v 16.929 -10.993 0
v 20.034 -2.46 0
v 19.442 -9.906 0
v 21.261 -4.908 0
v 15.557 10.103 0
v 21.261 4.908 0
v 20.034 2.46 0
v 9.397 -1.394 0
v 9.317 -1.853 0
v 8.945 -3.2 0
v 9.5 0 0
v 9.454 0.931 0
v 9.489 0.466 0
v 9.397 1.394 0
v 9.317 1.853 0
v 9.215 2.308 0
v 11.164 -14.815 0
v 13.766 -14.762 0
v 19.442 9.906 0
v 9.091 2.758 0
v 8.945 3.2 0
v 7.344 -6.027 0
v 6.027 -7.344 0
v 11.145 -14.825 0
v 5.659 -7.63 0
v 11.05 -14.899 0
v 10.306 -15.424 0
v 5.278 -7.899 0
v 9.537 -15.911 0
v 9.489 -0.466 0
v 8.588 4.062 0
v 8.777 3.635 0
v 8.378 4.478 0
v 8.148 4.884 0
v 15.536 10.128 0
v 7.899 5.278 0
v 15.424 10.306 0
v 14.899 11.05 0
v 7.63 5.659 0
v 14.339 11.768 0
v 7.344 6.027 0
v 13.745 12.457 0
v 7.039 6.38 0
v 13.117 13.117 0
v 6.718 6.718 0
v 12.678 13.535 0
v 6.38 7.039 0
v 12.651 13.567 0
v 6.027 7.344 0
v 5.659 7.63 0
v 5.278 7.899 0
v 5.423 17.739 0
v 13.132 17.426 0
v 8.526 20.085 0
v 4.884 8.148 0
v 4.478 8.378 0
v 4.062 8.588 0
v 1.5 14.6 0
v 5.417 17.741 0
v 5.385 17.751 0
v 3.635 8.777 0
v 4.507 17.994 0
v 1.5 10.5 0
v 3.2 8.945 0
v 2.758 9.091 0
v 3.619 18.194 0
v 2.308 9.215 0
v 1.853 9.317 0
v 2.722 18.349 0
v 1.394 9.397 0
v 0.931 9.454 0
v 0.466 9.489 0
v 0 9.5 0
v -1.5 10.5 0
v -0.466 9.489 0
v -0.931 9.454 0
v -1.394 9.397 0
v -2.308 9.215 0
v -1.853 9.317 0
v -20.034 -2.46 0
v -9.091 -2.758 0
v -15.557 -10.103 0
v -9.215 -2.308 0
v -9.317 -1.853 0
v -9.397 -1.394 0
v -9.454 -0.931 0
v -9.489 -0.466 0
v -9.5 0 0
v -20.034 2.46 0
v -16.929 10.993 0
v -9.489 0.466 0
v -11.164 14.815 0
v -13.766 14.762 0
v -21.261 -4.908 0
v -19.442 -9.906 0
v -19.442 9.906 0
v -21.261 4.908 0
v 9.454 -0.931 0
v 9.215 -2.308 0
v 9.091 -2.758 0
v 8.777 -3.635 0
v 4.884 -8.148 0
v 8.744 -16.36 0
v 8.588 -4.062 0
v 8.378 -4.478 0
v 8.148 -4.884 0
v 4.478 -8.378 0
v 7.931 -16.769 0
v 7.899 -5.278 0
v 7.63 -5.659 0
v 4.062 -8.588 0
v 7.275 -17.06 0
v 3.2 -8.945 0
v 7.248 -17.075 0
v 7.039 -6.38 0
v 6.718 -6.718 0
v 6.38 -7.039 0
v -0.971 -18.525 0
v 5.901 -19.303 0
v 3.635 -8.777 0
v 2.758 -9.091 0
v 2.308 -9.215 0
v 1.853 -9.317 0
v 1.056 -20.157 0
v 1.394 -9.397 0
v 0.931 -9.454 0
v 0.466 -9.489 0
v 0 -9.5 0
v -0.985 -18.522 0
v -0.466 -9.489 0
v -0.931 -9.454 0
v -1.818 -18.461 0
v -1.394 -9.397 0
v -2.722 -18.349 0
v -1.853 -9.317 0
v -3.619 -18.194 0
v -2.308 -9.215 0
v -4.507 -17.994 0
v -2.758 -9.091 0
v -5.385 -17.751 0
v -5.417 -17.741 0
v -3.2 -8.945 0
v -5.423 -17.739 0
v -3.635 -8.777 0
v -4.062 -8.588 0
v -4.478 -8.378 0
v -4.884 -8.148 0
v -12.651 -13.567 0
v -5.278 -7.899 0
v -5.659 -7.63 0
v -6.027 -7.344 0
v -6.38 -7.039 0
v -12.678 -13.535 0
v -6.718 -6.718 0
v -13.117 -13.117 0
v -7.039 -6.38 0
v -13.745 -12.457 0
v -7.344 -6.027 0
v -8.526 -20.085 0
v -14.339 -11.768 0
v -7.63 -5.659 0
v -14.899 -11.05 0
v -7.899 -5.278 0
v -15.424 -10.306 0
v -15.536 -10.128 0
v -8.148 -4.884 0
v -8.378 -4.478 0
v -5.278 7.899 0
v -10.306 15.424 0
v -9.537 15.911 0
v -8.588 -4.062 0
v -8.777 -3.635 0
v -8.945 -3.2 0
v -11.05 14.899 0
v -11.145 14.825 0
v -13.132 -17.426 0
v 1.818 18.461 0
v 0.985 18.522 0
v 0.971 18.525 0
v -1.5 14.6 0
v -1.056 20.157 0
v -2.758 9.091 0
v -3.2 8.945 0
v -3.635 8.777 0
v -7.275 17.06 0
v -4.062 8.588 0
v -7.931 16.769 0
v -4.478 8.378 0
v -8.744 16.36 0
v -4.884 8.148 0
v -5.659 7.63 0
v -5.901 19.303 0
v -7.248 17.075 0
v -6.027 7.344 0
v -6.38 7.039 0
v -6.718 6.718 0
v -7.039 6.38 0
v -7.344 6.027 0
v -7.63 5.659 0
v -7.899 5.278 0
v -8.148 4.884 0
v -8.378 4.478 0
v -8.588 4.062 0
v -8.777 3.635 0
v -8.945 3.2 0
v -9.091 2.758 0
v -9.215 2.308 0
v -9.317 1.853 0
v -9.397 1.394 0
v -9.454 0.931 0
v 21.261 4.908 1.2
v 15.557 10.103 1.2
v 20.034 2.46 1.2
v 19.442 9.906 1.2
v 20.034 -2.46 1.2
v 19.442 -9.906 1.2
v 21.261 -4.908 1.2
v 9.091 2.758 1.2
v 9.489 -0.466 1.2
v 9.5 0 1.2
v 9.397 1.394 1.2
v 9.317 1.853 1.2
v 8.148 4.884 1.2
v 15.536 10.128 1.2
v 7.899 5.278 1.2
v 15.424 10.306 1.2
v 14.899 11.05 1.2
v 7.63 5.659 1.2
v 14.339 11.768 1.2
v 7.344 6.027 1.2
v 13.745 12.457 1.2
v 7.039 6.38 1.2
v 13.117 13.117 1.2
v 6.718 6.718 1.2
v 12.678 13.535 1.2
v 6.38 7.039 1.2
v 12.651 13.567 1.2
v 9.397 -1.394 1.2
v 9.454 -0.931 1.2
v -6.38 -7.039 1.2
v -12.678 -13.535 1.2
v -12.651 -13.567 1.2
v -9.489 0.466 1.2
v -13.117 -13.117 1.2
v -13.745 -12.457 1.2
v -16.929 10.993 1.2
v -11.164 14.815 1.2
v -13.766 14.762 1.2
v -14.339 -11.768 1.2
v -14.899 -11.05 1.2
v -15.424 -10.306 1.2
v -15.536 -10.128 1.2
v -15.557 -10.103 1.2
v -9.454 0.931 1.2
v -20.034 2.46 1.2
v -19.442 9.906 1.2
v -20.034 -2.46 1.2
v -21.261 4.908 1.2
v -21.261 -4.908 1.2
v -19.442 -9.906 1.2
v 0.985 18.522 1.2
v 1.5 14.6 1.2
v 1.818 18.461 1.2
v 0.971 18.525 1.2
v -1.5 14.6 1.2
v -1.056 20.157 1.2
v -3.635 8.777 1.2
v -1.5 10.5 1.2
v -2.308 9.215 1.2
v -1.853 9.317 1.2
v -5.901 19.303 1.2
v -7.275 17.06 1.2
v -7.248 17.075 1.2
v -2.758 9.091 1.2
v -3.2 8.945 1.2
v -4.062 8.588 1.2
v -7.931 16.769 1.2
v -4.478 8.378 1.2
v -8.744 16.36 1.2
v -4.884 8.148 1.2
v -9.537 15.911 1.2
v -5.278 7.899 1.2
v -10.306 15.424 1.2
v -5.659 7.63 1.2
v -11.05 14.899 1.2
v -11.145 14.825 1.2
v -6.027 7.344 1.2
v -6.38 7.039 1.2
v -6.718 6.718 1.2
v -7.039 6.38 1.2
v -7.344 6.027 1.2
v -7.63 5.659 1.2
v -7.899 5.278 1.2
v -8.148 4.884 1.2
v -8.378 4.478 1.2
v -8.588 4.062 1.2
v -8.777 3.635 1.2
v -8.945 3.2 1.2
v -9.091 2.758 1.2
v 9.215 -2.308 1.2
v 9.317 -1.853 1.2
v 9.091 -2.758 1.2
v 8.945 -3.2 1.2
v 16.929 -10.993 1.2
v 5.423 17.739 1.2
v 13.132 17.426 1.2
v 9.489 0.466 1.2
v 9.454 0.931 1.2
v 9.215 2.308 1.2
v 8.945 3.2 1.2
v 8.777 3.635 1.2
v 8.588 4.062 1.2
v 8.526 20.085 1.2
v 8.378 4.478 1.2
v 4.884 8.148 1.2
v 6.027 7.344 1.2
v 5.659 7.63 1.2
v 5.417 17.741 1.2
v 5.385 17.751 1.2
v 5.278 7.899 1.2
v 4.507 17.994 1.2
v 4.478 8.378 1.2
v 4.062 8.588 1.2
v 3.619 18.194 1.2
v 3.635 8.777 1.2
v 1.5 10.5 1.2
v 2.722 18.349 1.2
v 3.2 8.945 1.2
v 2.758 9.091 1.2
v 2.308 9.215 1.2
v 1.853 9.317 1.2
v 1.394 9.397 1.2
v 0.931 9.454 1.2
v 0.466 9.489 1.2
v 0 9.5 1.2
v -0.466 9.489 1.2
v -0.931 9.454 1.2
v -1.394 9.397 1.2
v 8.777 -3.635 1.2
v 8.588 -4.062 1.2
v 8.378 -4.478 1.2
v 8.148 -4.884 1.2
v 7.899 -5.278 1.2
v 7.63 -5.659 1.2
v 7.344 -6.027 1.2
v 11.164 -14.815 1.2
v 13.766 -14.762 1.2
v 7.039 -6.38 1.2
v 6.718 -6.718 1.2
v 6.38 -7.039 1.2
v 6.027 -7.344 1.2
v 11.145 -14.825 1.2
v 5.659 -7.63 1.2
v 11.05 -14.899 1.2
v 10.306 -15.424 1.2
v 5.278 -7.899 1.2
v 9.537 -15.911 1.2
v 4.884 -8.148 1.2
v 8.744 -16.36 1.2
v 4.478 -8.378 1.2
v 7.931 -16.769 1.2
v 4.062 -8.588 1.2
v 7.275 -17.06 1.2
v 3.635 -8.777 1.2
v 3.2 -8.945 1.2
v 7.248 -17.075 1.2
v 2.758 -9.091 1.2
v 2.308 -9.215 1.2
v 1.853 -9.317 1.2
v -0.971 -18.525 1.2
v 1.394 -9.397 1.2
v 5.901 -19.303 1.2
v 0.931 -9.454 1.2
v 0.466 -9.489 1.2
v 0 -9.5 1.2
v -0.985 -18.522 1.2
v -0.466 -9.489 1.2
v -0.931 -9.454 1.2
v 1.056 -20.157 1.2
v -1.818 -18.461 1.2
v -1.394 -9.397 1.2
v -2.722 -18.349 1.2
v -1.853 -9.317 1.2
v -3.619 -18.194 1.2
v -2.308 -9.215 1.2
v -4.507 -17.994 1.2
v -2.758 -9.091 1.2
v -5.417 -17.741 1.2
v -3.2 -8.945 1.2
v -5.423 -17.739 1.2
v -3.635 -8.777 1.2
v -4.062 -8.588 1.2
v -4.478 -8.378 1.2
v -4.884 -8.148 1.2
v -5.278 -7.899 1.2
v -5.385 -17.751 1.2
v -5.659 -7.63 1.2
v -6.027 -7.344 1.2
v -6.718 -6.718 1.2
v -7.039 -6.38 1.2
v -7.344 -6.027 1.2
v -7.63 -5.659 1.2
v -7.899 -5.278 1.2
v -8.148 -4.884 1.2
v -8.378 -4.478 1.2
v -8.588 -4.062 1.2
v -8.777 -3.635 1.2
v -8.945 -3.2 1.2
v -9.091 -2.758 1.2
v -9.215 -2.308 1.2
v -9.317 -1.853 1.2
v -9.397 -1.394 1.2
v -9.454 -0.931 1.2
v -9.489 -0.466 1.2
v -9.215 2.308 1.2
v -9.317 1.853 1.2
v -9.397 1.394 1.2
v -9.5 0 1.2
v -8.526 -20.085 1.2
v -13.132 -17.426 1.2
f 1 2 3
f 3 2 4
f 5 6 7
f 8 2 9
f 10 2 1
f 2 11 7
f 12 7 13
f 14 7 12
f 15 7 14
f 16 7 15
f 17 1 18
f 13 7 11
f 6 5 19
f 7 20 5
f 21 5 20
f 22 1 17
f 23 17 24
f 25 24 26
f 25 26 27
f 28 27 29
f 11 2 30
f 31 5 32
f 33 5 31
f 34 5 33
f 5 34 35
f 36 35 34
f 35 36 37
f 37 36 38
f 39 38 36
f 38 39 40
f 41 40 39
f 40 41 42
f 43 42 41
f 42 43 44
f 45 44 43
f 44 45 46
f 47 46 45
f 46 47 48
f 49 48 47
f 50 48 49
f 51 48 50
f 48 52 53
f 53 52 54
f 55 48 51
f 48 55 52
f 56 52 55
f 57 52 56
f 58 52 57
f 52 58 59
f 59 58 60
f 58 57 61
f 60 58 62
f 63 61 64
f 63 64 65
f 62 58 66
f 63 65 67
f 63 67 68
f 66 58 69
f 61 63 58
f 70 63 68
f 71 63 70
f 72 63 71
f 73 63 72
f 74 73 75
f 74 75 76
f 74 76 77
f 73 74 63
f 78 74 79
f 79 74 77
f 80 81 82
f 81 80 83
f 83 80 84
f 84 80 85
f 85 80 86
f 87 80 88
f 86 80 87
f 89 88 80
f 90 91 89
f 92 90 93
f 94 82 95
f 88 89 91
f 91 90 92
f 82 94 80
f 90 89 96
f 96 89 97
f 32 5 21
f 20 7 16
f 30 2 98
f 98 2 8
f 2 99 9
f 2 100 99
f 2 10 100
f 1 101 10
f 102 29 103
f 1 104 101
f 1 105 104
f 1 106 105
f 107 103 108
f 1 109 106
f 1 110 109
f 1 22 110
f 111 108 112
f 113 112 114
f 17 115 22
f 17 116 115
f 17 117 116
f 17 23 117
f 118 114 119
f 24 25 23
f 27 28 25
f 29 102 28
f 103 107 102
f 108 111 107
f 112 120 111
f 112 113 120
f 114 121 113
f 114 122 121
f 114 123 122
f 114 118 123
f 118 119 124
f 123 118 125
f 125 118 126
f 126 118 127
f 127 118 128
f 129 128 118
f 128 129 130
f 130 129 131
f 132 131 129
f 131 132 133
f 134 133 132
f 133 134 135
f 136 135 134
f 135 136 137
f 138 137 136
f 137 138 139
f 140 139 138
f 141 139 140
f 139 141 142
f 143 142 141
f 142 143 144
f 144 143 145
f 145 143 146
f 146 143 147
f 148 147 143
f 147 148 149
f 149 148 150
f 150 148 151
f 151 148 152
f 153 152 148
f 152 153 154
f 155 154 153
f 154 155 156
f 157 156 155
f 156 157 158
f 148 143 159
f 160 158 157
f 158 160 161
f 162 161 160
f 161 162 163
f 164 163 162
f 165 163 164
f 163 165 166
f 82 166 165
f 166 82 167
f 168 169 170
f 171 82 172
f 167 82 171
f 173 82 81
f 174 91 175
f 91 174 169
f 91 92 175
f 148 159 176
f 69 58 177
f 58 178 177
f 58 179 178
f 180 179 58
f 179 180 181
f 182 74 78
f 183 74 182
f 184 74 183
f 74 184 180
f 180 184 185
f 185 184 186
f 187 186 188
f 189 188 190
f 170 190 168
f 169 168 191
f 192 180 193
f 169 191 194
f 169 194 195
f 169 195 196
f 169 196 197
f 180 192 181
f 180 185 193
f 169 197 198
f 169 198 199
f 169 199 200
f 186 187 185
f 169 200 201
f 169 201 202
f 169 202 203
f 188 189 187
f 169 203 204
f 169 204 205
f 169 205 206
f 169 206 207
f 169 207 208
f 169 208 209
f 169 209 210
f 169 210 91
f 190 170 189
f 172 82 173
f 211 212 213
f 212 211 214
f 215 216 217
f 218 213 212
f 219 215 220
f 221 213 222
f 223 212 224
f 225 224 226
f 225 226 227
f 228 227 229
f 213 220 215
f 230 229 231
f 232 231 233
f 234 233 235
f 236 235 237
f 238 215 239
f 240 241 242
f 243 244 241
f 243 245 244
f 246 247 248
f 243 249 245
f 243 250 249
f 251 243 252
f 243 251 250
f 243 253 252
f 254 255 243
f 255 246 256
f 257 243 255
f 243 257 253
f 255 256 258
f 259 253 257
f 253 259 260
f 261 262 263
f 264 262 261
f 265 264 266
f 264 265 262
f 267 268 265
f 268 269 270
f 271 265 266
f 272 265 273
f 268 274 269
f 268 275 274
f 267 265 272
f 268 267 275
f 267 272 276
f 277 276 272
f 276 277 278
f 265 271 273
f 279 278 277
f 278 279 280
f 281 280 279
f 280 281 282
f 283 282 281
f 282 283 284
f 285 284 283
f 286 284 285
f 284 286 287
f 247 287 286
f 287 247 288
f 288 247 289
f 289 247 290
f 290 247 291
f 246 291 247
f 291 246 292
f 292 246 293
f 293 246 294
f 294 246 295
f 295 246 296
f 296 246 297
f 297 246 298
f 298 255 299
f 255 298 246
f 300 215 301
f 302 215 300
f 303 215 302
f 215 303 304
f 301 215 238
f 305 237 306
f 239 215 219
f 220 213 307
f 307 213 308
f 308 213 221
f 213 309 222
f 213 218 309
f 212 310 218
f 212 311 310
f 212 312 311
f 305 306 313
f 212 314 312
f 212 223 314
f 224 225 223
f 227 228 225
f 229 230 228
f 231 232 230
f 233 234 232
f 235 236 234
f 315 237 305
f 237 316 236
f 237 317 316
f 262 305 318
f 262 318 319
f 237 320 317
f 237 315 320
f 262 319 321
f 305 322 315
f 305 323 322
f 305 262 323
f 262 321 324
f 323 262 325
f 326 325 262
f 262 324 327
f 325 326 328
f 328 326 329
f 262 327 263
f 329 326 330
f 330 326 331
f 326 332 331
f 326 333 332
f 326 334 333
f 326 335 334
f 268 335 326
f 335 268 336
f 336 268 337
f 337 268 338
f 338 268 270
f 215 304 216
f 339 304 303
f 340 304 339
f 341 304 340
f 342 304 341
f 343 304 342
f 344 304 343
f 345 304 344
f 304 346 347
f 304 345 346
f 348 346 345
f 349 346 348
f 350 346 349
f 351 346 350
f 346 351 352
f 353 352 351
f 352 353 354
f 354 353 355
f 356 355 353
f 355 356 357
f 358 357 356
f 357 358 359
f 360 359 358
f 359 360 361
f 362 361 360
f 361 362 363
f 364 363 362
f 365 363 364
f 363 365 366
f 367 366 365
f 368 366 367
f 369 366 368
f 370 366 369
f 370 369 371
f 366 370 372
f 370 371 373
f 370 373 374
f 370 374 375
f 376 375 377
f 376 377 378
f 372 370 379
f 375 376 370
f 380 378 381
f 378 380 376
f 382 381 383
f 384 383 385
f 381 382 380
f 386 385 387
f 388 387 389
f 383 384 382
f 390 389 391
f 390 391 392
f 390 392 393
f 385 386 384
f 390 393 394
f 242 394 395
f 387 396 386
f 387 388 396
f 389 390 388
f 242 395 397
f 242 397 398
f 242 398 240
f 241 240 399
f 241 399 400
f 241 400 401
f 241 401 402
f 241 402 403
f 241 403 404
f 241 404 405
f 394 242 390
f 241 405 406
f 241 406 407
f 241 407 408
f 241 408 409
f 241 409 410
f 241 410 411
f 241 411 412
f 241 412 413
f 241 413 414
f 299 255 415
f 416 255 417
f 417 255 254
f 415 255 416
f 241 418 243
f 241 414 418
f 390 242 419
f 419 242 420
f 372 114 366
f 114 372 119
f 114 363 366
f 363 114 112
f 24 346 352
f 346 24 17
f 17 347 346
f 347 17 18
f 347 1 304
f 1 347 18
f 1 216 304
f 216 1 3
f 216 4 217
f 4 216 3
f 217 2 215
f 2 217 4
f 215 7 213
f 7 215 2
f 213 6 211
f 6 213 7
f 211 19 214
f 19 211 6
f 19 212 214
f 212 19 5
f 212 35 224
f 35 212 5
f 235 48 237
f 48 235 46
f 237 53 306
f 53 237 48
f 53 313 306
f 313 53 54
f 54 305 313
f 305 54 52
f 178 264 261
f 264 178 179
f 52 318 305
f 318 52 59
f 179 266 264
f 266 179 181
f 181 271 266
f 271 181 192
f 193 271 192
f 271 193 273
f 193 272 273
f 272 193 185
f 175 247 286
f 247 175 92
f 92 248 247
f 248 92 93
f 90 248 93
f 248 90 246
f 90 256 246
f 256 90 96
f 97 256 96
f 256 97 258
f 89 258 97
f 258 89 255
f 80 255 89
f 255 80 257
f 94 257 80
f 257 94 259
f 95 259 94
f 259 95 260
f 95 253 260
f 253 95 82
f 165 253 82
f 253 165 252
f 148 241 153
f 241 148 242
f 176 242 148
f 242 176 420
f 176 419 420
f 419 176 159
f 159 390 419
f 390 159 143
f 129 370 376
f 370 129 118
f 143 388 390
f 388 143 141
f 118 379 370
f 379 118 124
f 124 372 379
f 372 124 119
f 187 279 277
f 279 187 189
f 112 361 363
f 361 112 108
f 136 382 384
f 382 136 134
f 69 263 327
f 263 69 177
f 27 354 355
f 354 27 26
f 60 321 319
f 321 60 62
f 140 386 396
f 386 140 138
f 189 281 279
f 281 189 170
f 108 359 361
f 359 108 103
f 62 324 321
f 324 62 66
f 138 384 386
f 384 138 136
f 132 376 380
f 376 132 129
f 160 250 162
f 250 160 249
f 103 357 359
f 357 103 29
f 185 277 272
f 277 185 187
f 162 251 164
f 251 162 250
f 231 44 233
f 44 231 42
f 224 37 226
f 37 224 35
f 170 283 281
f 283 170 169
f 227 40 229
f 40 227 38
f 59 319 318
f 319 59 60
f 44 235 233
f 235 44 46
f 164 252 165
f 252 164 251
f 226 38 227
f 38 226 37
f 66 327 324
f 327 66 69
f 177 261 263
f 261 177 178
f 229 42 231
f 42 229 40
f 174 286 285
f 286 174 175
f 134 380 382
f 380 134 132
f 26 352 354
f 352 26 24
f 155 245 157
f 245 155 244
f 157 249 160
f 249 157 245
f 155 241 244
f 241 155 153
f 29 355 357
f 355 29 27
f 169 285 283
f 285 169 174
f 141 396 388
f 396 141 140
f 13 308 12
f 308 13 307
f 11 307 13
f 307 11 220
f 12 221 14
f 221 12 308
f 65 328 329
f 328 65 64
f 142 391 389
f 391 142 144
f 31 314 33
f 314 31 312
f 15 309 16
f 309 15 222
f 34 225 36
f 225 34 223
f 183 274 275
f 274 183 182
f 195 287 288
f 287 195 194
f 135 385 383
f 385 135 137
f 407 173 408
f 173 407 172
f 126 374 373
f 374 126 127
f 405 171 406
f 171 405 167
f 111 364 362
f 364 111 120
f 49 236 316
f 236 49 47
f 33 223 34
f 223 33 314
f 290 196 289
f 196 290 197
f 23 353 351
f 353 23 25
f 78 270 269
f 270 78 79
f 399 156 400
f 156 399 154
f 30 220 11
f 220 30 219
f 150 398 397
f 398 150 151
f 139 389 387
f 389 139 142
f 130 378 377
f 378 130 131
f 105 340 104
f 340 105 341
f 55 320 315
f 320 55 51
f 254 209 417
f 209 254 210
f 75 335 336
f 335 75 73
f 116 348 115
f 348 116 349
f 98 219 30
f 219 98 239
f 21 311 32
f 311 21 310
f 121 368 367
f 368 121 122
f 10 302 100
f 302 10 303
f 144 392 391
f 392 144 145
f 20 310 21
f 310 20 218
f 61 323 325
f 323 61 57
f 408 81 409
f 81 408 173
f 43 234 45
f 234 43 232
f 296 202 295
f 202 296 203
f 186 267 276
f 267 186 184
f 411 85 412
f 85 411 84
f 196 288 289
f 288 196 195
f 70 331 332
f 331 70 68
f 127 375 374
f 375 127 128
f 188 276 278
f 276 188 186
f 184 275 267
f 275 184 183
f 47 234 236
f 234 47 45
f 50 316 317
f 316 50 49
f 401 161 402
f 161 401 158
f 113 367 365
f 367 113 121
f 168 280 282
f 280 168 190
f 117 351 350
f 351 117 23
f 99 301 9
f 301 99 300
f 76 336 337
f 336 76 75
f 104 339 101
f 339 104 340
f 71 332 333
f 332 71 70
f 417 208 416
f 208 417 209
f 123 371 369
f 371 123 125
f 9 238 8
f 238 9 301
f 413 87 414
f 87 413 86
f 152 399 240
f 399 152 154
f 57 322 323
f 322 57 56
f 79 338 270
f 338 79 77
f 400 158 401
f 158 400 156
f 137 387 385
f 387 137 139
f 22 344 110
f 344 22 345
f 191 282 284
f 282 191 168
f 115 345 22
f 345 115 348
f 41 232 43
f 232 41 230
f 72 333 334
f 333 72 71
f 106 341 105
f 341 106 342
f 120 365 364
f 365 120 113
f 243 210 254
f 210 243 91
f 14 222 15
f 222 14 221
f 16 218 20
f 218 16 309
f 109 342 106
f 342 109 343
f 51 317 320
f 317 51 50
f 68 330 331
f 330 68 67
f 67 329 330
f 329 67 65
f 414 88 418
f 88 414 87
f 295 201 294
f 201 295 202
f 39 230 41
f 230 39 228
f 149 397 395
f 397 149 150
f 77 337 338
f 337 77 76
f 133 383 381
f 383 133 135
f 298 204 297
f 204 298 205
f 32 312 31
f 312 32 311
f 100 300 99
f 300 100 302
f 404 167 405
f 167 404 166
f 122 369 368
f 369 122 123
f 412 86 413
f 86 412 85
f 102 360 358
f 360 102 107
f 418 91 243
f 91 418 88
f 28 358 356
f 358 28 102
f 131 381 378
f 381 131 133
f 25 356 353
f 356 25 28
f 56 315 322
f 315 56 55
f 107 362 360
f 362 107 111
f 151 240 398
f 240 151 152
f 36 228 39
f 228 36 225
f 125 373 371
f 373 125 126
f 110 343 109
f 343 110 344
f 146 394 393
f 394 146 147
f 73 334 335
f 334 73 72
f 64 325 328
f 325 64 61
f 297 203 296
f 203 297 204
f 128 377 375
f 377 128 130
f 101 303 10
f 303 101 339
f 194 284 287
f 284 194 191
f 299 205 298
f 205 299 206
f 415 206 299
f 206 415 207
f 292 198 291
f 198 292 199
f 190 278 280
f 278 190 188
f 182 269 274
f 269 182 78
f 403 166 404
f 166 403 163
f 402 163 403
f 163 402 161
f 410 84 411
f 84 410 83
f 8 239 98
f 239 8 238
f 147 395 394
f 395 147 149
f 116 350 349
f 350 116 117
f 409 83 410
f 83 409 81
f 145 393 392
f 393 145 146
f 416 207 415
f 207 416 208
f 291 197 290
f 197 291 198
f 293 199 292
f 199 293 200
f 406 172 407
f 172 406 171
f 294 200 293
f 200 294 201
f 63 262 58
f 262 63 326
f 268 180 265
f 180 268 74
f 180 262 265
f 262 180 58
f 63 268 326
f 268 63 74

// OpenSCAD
/*
  Elna Supermatic cam 29
  Name: Comb alternate
  Status: candidate

  Generated from measured parametric base v2.
  Surface mode: stepped
*/

include <_elna_measured_common.scad>;

profile_points = [
        [0.9708, 18.5246],
        [5.4235, 17.7395],
        [8.5258, 20.0854],
        [13.1316, 17.4262],
        [12.6511, 13.5666],
        [15.5573, 10.1031],
        [19.4418, 9.9061],
        [21.2608, 4.9084],
        [20.0345, 2.4599],
        [20.0345, -2.4599],
        [21.2608, -4.9084],
        [19.4418, -9.9061],
        [16.9286, -10.9935],
        [13.7661, -14.7624],
        [11.1637, -14.8147],
        [7.2481, -17.0754],
        [5.9015, -19.3030],
        [1.0564, -20.1573],
        [-0.9708, -18.5246],
        [-5.4235, -17.7395],
        [-8.5258, -20.0854],
        [-13.1316, -17.4262],
        [-12.6511, -13.5666],
        [-15.5573, -10.1031],
        [-19.4418, -9.9061],
        [-21.2608, -4.9084],
        [-20.0345, -2.4599],
        [-20.0345, 2.4599],
        [-21.2608, 4.9084],
        [-19.4418, 9.9061],
        [-16.9286, 10.9935],
        [-13.7661, 14.7624],
        [-11.1637, 14.8147],
        [-7.2481, 17.0754],
        [-5.9015, 19.3030],
        [-1.0564, 20.1573]
];

icon_points = [[-1.000,0.180], [-0.920,0.820], [-0.840,0.180], [-0.778,0.180], [-0.698,0.820], [-0.618,0.180], [-0.556,0.180], [-0.476,0.820], [-0.396,0.180], [-0.333,0.180], [-0.253,0.820], [-0.173,0.180], [-0.111,0.180], [-0.031,0.820], [0.049,0.180], [0.111,0.180], [0.191,0.820], [0.271,0.180], [0.333,0.180], [0.413,0.820], [0.493,0.180], [0.556,0.180], [0.636,0.820], [0.716,0.180], [0.778,0.180], [0.858,0.820], [0.938,0.180], [1.000,0.180]];

elna_cam_ring(profile_points=profile_points);
